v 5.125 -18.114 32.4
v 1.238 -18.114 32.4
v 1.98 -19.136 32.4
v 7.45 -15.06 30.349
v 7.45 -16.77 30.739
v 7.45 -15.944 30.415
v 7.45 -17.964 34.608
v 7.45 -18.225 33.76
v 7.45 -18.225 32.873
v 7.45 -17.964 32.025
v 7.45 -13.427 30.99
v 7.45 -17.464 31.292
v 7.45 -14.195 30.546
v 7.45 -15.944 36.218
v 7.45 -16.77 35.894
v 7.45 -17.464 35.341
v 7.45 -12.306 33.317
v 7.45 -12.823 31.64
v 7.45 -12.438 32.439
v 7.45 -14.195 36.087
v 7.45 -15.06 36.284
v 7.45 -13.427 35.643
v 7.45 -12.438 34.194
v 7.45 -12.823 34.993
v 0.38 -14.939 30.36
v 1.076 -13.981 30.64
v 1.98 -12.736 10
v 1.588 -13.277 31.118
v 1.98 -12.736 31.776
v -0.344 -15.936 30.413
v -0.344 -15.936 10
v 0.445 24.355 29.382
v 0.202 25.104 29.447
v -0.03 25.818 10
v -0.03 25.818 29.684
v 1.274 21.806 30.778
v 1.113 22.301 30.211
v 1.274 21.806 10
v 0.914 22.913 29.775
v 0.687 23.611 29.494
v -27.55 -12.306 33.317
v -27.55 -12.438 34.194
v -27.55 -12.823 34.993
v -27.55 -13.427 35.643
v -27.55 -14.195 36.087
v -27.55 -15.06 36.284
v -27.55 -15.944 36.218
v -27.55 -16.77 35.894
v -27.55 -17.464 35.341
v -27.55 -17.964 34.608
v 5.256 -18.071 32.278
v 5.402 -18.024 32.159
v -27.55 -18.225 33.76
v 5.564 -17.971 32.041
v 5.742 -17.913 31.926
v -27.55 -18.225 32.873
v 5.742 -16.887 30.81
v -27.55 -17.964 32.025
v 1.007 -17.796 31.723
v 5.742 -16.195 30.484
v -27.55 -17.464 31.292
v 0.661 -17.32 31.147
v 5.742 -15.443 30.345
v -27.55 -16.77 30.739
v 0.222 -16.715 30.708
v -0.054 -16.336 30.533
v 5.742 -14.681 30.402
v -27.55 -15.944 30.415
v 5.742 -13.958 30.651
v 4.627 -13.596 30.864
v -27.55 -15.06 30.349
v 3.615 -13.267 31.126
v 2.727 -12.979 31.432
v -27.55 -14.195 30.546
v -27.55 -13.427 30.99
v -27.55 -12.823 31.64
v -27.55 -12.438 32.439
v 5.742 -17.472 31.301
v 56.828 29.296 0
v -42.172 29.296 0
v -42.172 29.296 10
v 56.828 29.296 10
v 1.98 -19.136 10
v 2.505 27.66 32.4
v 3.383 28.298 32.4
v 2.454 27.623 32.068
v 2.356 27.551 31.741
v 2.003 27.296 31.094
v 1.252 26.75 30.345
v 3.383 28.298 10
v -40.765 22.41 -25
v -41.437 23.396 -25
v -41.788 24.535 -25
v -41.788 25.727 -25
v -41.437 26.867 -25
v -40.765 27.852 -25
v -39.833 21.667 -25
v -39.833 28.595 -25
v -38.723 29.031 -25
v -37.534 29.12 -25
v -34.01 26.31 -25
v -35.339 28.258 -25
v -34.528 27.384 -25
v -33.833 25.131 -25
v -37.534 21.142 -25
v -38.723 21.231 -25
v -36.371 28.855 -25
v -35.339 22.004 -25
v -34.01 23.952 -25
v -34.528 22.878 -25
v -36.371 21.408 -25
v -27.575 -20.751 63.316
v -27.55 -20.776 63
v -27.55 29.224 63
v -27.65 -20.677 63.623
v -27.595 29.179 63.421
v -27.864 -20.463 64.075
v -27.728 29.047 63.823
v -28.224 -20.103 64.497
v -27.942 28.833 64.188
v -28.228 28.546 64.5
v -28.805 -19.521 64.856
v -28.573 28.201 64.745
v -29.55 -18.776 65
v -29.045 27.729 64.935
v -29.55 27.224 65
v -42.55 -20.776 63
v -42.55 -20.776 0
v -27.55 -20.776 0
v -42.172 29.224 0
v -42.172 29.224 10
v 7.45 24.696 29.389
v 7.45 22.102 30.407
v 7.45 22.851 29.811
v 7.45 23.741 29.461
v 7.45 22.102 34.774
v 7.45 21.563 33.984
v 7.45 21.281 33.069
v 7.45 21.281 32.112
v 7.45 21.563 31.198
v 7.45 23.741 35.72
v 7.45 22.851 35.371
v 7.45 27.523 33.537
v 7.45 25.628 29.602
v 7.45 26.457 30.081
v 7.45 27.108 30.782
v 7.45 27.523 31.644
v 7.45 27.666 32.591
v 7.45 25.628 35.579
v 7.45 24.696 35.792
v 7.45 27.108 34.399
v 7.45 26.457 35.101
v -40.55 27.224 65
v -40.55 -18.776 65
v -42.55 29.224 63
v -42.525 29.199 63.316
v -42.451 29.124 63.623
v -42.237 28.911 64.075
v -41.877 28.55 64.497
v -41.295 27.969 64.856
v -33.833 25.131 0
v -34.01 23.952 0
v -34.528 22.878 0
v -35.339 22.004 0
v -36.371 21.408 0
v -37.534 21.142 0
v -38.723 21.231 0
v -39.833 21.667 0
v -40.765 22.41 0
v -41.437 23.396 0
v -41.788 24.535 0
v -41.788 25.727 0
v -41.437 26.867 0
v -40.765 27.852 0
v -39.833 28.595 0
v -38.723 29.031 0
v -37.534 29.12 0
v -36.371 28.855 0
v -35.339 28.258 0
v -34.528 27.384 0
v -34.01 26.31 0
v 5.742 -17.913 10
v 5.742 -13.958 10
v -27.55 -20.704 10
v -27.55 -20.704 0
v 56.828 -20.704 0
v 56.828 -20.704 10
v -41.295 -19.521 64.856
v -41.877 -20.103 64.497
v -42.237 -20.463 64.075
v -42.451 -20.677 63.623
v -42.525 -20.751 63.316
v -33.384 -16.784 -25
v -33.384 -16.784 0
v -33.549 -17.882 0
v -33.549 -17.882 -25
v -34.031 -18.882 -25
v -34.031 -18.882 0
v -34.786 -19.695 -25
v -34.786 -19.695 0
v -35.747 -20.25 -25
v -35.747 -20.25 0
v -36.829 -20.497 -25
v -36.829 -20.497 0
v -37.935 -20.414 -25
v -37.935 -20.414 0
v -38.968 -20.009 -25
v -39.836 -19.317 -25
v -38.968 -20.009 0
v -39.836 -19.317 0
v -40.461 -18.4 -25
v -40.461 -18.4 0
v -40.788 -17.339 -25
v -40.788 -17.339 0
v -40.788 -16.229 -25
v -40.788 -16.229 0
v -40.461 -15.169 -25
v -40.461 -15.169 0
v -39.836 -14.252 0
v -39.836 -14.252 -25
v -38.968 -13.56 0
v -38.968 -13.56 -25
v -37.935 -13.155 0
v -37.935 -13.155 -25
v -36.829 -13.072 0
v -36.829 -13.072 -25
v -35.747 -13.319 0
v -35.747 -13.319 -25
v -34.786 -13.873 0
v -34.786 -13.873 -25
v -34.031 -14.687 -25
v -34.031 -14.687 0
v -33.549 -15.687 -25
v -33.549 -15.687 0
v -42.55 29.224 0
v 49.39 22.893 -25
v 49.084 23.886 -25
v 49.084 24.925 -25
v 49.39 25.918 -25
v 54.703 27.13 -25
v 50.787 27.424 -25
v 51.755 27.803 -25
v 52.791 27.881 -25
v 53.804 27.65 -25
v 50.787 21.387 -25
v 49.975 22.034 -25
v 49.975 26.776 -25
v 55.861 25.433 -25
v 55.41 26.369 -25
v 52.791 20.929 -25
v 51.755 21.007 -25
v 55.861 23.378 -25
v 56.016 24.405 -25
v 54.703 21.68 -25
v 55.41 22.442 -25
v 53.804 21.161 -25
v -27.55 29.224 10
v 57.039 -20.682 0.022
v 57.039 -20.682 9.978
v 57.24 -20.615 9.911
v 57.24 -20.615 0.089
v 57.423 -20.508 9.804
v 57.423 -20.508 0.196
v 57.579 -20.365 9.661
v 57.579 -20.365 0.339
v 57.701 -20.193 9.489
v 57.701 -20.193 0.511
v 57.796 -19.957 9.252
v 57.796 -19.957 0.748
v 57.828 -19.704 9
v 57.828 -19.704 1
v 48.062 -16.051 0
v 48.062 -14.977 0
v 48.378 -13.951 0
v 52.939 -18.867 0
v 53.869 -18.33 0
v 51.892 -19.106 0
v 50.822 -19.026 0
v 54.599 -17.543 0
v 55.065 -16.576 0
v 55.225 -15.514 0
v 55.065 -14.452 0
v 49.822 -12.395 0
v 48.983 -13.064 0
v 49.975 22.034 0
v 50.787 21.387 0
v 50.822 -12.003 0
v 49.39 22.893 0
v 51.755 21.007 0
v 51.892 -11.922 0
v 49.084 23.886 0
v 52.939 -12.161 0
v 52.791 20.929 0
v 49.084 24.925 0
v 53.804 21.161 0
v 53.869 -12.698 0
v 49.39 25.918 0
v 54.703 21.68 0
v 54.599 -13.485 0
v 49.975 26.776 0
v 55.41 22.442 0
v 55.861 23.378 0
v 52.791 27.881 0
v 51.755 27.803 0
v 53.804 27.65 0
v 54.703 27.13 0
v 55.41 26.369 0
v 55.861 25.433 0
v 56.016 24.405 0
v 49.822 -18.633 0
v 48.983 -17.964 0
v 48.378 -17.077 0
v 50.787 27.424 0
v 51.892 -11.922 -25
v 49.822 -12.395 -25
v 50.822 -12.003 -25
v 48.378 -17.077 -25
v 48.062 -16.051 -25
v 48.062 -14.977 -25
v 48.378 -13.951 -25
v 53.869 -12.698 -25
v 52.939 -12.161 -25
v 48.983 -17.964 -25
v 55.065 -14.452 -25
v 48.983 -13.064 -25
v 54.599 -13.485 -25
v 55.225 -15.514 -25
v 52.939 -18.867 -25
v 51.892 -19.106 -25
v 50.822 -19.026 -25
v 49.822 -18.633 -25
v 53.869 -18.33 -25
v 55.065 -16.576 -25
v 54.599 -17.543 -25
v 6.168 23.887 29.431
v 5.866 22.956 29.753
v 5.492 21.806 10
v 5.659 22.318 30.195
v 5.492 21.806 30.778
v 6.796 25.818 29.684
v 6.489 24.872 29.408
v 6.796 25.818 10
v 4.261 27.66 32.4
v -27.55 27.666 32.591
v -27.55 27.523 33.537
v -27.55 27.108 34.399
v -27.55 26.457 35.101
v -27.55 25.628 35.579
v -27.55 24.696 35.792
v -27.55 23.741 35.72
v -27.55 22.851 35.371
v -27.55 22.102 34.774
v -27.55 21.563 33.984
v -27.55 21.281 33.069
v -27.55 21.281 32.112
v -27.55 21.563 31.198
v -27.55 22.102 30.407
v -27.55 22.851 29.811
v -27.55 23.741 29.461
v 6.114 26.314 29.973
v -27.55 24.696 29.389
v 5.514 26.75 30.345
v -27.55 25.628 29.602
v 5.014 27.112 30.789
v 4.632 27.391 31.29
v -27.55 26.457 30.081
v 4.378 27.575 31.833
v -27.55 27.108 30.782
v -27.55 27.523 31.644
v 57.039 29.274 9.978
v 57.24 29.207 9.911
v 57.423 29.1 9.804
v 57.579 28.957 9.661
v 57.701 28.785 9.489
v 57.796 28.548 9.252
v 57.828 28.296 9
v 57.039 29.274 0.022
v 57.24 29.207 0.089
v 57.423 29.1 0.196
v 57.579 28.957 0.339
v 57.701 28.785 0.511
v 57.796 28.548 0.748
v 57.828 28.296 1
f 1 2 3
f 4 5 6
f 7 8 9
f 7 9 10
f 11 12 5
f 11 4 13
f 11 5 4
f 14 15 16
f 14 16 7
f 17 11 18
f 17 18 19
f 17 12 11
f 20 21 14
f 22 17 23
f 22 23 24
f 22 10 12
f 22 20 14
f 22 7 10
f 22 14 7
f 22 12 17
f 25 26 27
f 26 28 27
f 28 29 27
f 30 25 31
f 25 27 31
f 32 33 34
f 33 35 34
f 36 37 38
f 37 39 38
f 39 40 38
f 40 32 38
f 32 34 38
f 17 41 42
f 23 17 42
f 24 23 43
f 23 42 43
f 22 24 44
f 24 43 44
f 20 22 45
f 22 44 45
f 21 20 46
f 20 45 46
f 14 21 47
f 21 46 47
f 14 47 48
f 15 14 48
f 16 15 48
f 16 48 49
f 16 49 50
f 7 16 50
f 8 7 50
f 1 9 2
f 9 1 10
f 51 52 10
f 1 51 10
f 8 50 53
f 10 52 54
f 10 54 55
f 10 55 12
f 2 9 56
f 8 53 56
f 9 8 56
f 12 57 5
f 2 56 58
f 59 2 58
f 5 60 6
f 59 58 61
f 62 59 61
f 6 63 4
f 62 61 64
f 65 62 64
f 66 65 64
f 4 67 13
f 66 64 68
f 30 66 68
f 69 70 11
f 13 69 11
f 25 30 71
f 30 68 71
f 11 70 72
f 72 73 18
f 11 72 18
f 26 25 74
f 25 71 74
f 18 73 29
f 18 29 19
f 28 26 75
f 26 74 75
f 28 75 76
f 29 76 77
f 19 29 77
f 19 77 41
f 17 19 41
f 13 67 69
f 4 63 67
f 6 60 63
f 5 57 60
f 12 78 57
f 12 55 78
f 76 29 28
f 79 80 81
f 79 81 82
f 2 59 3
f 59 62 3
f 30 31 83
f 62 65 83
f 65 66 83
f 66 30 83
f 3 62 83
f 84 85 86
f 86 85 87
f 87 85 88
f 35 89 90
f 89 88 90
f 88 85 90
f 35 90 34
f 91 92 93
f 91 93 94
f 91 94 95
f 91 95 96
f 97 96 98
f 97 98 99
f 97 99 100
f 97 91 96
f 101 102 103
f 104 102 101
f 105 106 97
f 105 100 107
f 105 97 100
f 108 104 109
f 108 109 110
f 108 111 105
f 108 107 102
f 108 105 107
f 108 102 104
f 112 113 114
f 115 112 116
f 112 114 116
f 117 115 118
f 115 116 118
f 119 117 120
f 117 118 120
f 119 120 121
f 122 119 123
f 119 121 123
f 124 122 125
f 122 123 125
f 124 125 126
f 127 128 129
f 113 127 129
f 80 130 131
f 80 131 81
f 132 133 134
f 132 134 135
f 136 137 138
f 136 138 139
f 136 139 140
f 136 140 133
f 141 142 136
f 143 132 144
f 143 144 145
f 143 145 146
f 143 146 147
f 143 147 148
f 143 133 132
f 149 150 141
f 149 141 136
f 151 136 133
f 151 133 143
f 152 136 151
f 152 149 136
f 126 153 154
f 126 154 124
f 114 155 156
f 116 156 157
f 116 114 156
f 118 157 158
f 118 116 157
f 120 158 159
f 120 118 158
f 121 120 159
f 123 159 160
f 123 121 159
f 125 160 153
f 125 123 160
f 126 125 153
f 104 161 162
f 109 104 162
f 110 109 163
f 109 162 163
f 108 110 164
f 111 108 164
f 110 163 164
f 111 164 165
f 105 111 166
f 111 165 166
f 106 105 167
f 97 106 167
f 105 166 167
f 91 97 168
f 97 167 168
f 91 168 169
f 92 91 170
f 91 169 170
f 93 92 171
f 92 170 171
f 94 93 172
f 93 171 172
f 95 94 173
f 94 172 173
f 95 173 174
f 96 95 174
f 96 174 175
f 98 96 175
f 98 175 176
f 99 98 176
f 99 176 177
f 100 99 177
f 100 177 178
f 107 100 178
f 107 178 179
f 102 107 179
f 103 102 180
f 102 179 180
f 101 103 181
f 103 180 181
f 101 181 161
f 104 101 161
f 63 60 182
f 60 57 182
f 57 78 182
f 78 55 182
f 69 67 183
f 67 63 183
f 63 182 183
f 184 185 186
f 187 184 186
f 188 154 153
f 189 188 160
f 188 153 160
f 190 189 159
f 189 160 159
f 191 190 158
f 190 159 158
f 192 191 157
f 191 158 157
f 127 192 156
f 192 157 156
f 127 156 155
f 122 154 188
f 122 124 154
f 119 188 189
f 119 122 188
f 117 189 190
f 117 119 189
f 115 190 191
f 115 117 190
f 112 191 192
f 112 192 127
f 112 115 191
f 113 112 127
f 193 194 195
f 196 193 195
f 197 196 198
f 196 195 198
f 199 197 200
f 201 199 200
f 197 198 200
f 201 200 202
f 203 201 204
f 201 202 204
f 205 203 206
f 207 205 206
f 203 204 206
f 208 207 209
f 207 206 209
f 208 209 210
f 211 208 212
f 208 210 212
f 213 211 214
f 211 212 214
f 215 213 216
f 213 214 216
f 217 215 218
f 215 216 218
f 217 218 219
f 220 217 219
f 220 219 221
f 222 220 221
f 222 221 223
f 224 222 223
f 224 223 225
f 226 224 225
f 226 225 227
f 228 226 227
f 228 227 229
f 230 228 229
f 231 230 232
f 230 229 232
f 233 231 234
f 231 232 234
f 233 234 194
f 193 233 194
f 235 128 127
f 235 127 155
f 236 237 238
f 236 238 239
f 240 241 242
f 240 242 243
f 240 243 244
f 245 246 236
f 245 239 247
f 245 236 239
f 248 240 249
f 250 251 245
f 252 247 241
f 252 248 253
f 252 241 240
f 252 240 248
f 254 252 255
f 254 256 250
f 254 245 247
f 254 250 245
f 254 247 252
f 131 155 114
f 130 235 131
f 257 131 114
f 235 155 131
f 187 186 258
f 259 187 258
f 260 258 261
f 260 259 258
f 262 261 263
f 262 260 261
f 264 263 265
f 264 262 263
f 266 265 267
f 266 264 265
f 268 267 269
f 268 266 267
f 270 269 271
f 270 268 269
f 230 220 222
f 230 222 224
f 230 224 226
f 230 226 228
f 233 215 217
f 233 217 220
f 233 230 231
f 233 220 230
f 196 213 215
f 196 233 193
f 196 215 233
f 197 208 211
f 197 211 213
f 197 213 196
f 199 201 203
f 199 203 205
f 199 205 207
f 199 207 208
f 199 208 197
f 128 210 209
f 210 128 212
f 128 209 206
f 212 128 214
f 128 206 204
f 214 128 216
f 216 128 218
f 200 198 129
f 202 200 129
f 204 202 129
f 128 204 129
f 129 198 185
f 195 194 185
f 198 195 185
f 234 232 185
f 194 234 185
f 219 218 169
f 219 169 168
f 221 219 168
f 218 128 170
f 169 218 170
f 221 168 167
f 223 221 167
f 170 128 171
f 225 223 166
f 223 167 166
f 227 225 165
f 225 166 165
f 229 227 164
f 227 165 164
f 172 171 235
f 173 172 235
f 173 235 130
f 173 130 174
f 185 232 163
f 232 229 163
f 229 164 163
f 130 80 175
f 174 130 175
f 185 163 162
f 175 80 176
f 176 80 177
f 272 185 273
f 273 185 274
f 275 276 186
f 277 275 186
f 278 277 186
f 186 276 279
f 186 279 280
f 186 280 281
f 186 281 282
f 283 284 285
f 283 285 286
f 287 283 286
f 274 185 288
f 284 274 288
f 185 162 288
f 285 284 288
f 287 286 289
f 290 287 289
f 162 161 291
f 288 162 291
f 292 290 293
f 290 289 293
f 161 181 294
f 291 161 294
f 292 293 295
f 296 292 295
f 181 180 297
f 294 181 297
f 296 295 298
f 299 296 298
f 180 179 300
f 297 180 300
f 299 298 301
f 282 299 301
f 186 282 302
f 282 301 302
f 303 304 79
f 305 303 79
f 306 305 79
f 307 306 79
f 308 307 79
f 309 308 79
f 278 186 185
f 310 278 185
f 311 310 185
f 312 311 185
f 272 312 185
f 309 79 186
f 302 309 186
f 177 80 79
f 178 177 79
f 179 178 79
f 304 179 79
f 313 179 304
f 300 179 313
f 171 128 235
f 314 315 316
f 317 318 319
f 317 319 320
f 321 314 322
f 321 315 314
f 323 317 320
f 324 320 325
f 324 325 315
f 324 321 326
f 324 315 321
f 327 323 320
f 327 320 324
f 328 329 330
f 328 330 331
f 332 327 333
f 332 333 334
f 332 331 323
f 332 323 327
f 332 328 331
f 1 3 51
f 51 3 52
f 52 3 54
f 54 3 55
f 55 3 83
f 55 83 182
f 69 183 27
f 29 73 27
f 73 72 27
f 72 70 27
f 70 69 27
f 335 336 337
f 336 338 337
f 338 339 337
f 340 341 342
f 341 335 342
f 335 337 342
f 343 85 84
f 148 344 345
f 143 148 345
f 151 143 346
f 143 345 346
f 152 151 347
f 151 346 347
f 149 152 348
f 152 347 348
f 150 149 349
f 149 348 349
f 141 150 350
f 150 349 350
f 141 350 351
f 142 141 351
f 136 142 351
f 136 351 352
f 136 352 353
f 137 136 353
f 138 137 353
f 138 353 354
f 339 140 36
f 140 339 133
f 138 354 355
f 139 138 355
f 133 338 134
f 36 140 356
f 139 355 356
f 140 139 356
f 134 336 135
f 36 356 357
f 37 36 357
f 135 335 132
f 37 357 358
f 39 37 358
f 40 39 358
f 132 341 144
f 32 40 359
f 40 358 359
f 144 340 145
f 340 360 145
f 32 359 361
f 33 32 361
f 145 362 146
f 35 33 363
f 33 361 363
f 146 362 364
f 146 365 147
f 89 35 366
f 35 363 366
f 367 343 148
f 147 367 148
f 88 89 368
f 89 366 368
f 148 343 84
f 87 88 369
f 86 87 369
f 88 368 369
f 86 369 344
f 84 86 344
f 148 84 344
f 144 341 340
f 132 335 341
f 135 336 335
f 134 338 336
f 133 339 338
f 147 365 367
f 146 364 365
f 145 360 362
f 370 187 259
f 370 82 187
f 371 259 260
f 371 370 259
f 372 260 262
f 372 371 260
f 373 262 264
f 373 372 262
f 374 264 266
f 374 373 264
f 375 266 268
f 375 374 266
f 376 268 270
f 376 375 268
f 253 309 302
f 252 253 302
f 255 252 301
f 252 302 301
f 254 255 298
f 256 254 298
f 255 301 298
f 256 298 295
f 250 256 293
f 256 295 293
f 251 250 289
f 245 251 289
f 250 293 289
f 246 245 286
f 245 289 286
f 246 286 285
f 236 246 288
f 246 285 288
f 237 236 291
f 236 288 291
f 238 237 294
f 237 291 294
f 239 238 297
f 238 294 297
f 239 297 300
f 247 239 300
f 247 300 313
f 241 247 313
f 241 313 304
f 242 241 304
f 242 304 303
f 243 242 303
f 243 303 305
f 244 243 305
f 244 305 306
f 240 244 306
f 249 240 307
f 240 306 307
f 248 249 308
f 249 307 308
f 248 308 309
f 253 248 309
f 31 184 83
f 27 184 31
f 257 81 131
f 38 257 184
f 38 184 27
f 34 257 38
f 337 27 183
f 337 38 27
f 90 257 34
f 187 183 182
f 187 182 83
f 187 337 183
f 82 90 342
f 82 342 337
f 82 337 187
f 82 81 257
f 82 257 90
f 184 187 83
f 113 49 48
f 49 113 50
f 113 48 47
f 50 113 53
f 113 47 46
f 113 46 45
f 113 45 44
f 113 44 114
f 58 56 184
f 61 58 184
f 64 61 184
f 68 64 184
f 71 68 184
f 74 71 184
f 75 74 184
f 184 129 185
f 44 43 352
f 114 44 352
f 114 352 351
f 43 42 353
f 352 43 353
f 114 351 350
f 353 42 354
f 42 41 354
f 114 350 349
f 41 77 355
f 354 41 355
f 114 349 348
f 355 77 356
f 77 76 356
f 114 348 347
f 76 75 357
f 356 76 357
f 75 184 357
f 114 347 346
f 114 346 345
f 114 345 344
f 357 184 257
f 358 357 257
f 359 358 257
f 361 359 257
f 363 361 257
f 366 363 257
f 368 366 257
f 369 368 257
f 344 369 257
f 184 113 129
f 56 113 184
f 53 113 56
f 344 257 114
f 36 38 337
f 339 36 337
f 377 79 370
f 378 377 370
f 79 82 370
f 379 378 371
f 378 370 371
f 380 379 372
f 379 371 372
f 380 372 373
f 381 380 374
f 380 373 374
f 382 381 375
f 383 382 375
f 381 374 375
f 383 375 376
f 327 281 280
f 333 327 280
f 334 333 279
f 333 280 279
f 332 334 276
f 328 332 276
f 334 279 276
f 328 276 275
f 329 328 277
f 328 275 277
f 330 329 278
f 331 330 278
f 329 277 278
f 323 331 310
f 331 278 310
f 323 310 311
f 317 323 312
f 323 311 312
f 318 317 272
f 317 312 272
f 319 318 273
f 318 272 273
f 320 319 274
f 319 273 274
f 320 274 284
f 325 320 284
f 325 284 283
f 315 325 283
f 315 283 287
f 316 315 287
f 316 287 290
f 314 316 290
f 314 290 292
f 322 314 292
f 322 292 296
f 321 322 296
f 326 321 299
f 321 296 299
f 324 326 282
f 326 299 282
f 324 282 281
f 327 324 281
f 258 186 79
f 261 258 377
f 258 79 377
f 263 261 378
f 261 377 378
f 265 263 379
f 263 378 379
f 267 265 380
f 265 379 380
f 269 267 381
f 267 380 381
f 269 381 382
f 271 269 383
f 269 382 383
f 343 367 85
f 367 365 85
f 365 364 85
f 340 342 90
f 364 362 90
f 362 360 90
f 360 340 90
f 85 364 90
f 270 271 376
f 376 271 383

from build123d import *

# Parameters (mm, degrees)
F0_W     = 100
F0_H     = 50
F1_DEPTH = 10
F2_R     = 3.601713
F2_R_2   = 3.485572
F2_R_3   = 3.723077
F2_R_4   = 4
F3_DEPTH = 25
F4_W     = 15
F4_H     = 50
F5_DEPTH = 65
F6_R     = 2.976027
F6_R_2   = 3.210208
F7_DEPTH = 35
F9_DEPTH = 22.4
F10_R    = 2
F11_R    = 1


with BuildPart() as f1:
    # F0 (on Top) → F1 (new body)
    with BuildSketch(Plane.XY):
        with Locations((7.828464, 4.295976)):
            Rectangle(F0_W, F0_H)
    extrude(amount=F1_DEPTH)

    # F2 (on face) → F3 (join)
    with BuildSketch(Plane(origin=(0, 0, 0), x_dir=(1, 0, 0), z_dir=(0, 0, -1))):
        with Locations((51.622987, 15.514113)):
            Circle(F2_R)
        with Locations((52.530244, -24.405243)):
            Circle(F2_R_2)
        with Locations((-37.106857, 16.784275)):
            Circle(F2_R_3)
        with Locations((-37.832662, -25.13105)):
            Circle(F2_R_4)
    extrude(amount=F3_DEPTH)

    # F4 (on Top) → F5 (join)
    with BuildSketch(Plane.XY):
        with Locations((-35.050407, 4.223788)):
            Rectangle(F4_W, F4_H)
    extrude(amount=F5_DEPTH)

    # F6 (on face) → F7 (join)
    with BuildSketch(Plane.YZ.offset(-27.550407)):
        with Locations((-15.28226, 33.31653)):
            Circle(F6_R)
        with Locations((24.455646, 32.590725)):
            Circle(F6_R_2)
    extrude(amount=F7_DEPTH)

    # F8 (on face) → F9 (join)
    with BuildSketch(Plane.XY.offset(10)):
        Polygon((5.741771, -17.913366), (5.741771, -13.958396), (1.980372, -12.736244), (-0.344301, -15.935881), (1.980372, -19.135518), align=None)
        Polygon((1.273584, 21.806058), (5.492217, 21.806058), (6.795846, 25.818216), (3.3829, 28.297866), (-0.030045, 25.818216), align=None)
    extrude(amount=F9_DEPTH)

    # F10
    f10_edges = [f1.edges().sort_by_distance(p)[0] for p in [
        (-42.550407, 4.223788, 65),
        (-35.050407, -20.776212, 65),
        (-27.550407, 4.223788, 65),
        (-35.050407, 29.223788, 65),
    ]]
    fillet(f10_edges, radius=F10_R)

    # F11
    f11_edges = [f1.edges().sort_by_distance(p)[0] for p in [
        (57.828464, -20.704024, 5),
        (57.828464, 29.295976, 5),
        (57.828464, 4.295976, 0),
        (57.828464, 4.295976, 10),
    ]]
    fillet(f11_edges, radius=F11_R)


solid = f1.part
